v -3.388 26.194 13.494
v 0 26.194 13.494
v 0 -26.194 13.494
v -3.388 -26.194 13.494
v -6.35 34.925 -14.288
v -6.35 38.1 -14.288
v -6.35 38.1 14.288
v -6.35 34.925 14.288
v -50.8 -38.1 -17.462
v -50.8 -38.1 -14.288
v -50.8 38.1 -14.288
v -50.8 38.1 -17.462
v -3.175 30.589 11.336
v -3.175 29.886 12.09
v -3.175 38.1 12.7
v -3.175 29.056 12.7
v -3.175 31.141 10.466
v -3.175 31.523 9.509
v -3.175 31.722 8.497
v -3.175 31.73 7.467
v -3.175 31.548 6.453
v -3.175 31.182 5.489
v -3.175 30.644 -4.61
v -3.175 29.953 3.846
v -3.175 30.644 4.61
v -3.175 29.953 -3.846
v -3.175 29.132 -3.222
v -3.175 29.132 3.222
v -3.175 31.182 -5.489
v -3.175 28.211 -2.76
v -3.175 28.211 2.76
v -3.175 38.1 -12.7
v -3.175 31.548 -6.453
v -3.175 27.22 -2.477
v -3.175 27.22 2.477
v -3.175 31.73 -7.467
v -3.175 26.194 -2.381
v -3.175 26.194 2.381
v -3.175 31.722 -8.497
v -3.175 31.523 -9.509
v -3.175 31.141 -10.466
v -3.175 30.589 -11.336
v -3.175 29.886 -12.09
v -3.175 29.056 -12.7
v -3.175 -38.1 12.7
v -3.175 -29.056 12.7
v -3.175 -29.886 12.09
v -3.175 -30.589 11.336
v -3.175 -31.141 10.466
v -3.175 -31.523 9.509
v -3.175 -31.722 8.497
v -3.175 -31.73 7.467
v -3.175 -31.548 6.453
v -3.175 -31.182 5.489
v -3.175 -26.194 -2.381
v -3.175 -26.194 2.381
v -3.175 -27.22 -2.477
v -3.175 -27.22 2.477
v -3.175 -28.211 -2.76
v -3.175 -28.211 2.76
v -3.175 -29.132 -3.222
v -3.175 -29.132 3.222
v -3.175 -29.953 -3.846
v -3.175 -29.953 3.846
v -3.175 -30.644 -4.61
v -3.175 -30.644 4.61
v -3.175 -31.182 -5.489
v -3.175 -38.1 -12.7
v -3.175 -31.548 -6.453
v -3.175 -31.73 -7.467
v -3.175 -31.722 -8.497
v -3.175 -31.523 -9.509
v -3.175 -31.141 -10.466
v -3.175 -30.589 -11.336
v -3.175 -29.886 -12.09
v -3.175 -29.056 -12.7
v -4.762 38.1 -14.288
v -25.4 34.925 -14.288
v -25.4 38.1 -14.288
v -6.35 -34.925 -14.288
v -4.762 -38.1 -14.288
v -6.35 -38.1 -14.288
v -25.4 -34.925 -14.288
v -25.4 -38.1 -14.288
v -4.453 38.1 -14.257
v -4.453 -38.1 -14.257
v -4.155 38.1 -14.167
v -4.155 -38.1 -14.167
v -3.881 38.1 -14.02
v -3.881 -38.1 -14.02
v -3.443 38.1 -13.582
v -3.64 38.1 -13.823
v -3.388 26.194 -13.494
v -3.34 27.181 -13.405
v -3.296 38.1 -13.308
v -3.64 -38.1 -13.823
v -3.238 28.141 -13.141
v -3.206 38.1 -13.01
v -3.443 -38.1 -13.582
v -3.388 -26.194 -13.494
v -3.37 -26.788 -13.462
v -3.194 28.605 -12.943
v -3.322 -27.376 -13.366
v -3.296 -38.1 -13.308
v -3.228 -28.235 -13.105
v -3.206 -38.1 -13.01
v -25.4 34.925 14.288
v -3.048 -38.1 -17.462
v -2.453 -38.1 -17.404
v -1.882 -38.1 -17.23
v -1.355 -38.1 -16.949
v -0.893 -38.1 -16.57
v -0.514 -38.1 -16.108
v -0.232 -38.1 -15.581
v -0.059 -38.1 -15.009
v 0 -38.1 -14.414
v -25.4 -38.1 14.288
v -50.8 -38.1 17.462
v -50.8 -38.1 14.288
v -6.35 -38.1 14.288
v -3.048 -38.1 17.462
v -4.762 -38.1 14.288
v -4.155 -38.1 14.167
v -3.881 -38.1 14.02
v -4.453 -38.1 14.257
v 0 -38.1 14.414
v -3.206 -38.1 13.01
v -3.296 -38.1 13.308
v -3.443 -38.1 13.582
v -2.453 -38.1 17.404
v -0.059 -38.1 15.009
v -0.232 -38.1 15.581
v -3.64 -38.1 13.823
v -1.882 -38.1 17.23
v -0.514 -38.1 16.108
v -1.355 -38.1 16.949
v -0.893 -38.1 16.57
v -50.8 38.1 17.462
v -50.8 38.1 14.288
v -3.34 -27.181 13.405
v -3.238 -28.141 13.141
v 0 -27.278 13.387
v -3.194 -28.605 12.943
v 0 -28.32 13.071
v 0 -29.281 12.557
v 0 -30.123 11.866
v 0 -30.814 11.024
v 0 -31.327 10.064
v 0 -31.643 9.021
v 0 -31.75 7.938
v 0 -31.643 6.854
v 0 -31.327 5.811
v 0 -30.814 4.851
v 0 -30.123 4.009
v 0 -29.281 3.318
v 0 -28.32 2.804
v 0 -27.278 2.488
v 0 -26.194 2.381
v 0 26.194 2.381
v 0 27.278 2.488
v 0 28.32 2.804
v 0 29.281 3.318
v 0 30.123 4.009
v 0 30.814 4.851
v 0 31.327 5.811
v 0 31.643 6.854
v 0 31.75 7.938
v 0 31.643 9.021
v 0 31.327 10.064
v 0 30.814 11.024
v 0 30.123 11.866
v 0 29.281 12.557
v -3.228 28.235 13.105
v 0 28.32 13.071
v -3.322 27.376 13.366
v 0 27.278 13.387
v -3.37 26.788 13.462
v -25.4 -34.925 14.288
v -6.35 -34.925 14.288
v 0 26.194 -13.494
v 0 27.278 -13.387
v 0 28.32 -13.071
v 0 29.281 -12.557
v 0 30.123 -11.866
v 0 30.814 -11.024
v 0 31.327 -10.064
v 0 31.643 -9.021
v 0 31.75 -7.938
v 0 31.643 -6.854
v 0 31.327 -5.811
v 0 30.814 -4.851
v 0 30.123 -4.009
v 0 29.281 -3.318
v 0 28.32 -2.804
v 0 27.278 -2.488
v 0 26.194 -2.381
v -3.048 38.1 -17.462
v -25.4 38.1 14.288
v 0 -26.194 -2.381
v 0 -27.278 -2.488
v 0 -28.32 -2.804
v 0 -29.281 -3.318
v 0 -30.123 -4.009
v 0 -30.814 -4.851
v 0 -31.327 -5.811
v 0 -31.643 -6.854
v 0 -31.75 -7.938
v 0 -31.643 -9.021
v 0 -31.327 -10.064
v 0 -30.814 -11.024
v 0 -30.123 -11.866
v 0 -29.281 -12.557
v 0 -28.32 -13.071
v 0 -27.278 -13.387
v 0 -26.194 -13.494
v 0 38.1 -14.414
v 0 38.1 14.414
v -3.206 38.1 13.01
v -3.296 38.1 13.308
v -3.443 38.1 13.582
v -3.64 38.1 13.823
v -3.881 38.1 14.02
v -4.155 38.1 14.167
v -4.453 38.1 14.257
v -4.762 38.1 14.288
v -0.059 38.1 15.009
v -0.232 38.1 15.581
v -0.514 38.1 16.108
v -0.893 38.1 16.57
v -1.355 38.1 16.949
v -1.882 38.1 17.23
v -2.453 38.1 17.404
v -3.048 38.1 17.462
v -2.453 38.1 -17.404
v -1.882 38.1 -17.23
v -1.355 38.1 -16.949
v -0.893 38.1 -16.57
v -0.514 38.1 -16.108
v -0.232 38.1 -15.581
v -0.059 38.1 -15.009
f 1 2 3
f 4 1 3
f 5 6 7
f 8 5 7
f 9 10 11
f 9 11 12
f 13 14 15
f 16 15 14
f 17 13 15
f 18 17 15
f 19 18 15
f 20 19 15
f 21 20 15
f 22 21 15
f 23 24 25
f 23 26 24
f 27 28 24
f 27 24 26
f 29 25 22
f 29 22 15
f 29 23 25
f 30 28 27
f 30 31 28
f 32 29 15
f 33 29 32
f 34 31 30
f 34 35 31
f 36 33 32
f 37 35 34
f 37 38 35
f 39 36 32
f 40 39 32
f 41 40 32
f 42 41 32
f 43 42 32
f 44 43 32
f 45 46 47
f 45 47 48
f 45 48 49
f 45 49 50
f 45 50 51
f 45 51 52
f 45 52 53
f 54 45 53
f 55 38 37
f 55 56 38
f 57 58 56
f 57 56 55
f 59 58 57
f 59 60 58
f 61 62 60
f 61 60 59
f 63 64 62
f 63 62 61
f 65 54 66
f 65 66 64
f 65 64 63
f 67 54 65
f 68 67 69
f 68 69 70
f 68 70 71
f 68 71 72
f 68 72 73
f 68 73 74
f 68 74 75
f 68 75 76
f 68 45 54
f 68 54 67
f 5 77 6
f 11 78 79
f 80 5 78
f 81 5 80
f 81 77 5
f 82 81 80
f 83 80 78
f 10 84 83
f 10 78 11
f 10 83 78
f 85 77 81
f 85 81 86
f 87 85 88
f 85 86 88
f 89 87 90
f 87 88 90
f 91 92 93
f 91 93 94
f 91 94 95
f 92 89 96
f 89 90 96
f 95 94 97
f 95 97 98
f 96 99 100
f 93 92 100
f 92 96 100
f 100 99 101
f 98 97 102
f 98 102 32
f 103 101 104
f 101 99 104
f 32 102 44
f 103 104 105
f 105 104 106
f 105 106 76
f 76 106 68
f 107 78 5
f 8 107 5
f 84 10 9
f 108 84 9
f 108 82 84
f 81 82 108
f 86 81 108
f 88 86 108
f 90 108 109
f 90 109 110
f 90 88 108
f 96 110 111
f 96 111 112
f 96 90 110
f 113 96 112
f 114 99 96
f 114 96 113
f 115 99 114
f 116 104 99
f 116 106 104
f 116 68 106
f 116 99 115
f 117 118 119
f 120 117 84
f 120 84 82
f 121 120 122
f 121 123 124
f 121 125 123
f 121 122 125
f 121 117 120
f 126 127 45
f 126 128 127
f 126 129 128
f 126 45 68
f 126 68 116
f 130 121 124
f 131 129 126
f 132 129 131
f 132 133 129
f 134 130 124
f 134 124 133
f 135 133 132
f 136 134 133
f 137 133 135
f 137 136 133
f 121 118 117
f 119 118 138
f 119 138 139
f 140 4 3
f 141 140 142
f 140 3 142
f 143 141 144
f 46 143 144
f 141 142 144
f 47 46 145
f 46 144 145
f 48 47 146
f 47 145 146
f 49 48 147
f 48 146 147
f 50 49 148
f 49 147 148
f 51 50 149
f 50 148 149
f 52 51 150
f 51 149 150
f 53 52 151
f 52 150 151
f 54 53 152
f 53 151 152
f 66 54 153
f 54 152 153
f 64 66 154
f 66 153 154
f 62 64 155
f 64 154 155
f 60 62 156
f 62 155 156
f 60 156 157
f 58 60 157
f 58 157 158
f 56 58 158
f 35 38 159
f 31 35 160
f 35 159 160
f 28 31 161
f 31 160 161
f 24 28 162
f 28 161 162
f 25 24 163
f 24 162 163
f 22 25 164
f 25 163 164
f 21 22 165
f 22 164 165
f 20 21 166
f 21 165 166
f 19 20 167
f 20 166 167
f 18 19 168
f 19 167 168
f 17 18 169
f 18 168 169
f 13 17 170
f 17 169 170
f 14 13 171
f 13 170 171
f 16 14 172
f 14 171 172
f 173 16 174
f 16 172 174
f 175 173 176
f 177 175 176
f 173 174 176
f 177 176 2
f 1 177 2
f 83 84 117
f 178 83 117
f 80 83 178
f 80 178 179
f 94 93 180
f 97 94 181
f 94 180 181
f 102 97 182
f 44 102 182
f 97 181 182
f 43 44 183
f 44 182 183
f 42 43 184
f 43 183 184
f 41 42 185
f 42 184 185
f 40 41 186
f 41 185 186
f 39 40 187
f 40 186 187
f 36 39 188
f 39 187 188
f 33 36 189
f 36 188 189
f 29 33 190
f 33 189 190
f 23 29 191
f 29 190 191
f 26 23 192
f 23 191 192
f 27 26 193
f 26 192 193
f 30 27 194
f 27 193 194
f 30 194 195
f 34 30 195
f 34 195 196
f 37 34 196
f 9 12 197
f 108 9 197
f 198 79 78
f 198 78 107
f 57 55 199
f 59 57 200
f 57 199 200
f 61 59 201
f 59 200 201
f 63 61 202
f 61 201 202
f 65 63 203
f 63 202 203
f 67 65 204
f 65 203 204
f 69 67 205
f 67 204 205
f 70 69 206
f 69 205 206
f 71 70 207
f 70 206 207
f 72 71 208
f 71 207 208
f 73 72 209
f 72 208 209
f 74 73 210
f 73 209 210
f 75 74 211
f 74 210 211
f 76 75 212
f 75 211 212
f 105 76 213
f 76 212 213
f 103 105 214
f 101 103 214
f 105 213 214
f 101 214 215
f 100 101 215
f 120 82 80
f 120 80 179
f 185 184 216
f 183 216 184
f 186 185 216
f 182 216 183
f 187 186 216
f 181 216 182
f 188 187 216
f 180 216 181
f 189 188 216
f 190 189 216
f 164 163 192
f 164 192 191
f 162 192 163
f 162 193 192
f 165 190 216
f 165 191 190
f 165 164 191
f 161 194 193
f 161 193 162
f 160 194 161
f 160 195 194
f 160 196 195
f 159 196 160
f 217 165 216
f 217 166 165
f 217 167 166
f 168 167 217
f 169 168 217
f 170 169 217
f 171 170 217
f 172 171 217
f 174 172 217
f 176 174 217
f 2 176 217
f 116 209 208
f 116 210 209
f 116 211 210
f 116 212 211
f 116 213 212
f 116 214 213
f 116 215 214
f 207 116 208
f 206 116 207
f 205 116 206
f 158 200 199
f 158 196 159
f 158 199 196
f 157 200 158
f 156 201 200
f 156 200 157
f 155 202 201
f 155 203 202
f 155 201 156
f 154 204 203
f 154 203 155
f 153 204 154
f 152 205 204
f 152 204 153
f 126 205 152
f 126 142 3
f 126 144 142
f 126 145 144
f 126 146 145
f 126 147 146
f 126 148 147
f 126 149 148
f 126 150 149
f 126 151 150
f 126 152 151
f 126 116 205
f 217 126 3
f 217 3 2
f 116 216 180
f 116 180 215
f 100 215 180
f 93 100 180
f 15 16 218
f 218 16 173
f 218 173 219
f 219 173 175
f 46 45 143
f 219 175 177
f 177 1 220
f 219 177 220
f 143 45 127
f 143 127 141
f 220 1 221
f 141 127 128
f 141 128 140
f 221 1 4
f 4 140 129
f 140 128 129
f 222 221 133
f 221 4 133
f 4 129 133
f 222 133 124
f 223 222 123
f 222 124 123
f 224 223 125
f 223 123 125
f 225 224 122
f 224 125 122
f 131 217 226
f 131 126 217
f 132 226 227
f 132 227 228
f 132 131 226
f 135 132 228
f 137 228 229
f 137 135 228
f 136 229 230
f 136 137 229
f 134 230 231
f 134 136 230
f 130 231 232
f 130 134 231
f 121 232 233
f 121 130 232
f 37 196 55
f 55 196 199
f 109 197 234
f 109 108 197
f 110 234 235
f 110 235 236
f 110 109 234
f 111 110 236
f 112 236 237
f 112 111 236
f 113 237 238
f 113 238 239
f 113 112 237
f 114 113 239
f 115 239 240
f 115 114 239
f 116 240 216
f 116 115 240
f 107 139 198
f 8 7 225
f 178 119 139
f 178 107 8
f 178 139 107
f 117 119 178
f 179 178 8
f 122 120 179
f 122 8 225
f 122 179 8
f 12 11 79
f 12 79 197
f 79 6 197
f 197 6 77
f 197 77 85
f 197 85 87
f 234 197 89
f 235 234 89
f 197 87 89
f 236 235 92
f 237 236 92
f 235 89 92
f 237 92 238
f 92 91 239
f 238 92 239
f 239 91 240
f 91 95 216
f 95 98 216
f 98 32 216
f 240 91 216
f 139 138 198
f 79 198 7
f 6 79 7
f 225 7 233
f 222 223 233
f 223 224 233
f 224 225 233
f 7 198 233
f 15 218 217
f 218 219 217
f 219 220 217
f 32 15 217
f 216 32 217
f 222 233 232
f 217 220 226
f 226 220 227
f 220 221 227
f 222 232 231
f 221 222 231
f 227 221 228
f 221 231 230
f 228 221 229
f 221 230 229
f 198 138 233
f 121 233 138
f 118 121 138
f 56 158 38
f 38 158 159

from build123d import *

# Parameters (mm, degrees)
PAD7398_DEPTH   = 38.1
SKETCH8421_W    = 19.05
SKETCH8421_H    = 31.75
PAD7397_DEPTH   = 3.175
POCKET691_DEPTH = 50.801


with BuildPart() as part:
    # Sketch8418 → Pad7398 (new body, symmetric)
    with BuildSketch(Plane.XZ):
        with BuildLine():
            ThreePointArc((0, 14.4145), (-0.892739, 16.569761), (-3.048, 17.4625))
            Line((-3.048, 17.4625), (-50.8, 17.4625))
            Line((-50.8, 17.4625), (-50.8, 14.2875))
            Line((-50.8, 14.2875), (-4.7625, 14.2875))
            ThreePointArc((-3.175, 12.7), (-3.639968, 13.822532), (-4.7625, 14.2875))
            Line((-3.175, 12.7), (-3.175, -12.7))
            ThreePointArc((-4.7625, -14.2875), (-3.639968, -13.822532), (-3.175, -12.7))
            Line((-4.7625, -14.2875), (-50.8, -14.2875))
            Line((-50.8, -14.2875), (-50.8, -17.4625))
            Line((-50.8, -17.4625), (-3.048, -17.4625))
            ThreePointArc((-3.048, -17.4625), (-0.892739, -16.569761), (0, -14.4145))
            Line((0, -14.4145), (0, 14.4145))
        make_face()
    extrude(amount=PAD7398_DEPTH, both=True)

    # Sketch8421 (on DatumPlane) → Pad7397 (join)
    with BuildSketch(Plane.XZ.offset(38.1)):
        with Locations((-15.875, 0)):
            Rectangle(SKETCH8421_W, SKETCH8421_H)
    pad7397 = extrude(amount=-PAD7397_DEPTH)

    # Mirrored017: Pad7397 across XZ
    add(pad7397.mirror(Plane.XZ))

    # Sketch8419 → Pocket691 (cut, through all)
    with BuildSketch(Plane.YZ):
        with BuildLine():
            ThreePointArc((26.19375, 2.38125), (31.75, 7.9375), (26.19375, 13.49375))
            Line((26.19375, 13.49375), (-26.19375, 13.49375))
            ThreePointArc((-26.19375, 13.49375), (-31.75, 7.9375), (-26.19375, 2.38125))
            Line((-26.19375, 2.38125), (26.19375, 2.38125))
        make_face()
        with BuildLine():
            ThreePointArc((26.19375, -13.49375), (31.75, -7.9375), (26.19375, -2.38125))
            Line((26.19375, -2.38125), (-26.19375, -2.38125))
            ThreePointArc((-26.19375, -2.38125), (-31.75, -7.9375), (-26.19375, -13.49375))
            Line((-26.19375, -13.49375), (26.19375, -13.49375))
        make_face()
    extrude(amount=-POCKET691_DEPTH, mode=Mode.SUBTRACT)


solid = part.part
